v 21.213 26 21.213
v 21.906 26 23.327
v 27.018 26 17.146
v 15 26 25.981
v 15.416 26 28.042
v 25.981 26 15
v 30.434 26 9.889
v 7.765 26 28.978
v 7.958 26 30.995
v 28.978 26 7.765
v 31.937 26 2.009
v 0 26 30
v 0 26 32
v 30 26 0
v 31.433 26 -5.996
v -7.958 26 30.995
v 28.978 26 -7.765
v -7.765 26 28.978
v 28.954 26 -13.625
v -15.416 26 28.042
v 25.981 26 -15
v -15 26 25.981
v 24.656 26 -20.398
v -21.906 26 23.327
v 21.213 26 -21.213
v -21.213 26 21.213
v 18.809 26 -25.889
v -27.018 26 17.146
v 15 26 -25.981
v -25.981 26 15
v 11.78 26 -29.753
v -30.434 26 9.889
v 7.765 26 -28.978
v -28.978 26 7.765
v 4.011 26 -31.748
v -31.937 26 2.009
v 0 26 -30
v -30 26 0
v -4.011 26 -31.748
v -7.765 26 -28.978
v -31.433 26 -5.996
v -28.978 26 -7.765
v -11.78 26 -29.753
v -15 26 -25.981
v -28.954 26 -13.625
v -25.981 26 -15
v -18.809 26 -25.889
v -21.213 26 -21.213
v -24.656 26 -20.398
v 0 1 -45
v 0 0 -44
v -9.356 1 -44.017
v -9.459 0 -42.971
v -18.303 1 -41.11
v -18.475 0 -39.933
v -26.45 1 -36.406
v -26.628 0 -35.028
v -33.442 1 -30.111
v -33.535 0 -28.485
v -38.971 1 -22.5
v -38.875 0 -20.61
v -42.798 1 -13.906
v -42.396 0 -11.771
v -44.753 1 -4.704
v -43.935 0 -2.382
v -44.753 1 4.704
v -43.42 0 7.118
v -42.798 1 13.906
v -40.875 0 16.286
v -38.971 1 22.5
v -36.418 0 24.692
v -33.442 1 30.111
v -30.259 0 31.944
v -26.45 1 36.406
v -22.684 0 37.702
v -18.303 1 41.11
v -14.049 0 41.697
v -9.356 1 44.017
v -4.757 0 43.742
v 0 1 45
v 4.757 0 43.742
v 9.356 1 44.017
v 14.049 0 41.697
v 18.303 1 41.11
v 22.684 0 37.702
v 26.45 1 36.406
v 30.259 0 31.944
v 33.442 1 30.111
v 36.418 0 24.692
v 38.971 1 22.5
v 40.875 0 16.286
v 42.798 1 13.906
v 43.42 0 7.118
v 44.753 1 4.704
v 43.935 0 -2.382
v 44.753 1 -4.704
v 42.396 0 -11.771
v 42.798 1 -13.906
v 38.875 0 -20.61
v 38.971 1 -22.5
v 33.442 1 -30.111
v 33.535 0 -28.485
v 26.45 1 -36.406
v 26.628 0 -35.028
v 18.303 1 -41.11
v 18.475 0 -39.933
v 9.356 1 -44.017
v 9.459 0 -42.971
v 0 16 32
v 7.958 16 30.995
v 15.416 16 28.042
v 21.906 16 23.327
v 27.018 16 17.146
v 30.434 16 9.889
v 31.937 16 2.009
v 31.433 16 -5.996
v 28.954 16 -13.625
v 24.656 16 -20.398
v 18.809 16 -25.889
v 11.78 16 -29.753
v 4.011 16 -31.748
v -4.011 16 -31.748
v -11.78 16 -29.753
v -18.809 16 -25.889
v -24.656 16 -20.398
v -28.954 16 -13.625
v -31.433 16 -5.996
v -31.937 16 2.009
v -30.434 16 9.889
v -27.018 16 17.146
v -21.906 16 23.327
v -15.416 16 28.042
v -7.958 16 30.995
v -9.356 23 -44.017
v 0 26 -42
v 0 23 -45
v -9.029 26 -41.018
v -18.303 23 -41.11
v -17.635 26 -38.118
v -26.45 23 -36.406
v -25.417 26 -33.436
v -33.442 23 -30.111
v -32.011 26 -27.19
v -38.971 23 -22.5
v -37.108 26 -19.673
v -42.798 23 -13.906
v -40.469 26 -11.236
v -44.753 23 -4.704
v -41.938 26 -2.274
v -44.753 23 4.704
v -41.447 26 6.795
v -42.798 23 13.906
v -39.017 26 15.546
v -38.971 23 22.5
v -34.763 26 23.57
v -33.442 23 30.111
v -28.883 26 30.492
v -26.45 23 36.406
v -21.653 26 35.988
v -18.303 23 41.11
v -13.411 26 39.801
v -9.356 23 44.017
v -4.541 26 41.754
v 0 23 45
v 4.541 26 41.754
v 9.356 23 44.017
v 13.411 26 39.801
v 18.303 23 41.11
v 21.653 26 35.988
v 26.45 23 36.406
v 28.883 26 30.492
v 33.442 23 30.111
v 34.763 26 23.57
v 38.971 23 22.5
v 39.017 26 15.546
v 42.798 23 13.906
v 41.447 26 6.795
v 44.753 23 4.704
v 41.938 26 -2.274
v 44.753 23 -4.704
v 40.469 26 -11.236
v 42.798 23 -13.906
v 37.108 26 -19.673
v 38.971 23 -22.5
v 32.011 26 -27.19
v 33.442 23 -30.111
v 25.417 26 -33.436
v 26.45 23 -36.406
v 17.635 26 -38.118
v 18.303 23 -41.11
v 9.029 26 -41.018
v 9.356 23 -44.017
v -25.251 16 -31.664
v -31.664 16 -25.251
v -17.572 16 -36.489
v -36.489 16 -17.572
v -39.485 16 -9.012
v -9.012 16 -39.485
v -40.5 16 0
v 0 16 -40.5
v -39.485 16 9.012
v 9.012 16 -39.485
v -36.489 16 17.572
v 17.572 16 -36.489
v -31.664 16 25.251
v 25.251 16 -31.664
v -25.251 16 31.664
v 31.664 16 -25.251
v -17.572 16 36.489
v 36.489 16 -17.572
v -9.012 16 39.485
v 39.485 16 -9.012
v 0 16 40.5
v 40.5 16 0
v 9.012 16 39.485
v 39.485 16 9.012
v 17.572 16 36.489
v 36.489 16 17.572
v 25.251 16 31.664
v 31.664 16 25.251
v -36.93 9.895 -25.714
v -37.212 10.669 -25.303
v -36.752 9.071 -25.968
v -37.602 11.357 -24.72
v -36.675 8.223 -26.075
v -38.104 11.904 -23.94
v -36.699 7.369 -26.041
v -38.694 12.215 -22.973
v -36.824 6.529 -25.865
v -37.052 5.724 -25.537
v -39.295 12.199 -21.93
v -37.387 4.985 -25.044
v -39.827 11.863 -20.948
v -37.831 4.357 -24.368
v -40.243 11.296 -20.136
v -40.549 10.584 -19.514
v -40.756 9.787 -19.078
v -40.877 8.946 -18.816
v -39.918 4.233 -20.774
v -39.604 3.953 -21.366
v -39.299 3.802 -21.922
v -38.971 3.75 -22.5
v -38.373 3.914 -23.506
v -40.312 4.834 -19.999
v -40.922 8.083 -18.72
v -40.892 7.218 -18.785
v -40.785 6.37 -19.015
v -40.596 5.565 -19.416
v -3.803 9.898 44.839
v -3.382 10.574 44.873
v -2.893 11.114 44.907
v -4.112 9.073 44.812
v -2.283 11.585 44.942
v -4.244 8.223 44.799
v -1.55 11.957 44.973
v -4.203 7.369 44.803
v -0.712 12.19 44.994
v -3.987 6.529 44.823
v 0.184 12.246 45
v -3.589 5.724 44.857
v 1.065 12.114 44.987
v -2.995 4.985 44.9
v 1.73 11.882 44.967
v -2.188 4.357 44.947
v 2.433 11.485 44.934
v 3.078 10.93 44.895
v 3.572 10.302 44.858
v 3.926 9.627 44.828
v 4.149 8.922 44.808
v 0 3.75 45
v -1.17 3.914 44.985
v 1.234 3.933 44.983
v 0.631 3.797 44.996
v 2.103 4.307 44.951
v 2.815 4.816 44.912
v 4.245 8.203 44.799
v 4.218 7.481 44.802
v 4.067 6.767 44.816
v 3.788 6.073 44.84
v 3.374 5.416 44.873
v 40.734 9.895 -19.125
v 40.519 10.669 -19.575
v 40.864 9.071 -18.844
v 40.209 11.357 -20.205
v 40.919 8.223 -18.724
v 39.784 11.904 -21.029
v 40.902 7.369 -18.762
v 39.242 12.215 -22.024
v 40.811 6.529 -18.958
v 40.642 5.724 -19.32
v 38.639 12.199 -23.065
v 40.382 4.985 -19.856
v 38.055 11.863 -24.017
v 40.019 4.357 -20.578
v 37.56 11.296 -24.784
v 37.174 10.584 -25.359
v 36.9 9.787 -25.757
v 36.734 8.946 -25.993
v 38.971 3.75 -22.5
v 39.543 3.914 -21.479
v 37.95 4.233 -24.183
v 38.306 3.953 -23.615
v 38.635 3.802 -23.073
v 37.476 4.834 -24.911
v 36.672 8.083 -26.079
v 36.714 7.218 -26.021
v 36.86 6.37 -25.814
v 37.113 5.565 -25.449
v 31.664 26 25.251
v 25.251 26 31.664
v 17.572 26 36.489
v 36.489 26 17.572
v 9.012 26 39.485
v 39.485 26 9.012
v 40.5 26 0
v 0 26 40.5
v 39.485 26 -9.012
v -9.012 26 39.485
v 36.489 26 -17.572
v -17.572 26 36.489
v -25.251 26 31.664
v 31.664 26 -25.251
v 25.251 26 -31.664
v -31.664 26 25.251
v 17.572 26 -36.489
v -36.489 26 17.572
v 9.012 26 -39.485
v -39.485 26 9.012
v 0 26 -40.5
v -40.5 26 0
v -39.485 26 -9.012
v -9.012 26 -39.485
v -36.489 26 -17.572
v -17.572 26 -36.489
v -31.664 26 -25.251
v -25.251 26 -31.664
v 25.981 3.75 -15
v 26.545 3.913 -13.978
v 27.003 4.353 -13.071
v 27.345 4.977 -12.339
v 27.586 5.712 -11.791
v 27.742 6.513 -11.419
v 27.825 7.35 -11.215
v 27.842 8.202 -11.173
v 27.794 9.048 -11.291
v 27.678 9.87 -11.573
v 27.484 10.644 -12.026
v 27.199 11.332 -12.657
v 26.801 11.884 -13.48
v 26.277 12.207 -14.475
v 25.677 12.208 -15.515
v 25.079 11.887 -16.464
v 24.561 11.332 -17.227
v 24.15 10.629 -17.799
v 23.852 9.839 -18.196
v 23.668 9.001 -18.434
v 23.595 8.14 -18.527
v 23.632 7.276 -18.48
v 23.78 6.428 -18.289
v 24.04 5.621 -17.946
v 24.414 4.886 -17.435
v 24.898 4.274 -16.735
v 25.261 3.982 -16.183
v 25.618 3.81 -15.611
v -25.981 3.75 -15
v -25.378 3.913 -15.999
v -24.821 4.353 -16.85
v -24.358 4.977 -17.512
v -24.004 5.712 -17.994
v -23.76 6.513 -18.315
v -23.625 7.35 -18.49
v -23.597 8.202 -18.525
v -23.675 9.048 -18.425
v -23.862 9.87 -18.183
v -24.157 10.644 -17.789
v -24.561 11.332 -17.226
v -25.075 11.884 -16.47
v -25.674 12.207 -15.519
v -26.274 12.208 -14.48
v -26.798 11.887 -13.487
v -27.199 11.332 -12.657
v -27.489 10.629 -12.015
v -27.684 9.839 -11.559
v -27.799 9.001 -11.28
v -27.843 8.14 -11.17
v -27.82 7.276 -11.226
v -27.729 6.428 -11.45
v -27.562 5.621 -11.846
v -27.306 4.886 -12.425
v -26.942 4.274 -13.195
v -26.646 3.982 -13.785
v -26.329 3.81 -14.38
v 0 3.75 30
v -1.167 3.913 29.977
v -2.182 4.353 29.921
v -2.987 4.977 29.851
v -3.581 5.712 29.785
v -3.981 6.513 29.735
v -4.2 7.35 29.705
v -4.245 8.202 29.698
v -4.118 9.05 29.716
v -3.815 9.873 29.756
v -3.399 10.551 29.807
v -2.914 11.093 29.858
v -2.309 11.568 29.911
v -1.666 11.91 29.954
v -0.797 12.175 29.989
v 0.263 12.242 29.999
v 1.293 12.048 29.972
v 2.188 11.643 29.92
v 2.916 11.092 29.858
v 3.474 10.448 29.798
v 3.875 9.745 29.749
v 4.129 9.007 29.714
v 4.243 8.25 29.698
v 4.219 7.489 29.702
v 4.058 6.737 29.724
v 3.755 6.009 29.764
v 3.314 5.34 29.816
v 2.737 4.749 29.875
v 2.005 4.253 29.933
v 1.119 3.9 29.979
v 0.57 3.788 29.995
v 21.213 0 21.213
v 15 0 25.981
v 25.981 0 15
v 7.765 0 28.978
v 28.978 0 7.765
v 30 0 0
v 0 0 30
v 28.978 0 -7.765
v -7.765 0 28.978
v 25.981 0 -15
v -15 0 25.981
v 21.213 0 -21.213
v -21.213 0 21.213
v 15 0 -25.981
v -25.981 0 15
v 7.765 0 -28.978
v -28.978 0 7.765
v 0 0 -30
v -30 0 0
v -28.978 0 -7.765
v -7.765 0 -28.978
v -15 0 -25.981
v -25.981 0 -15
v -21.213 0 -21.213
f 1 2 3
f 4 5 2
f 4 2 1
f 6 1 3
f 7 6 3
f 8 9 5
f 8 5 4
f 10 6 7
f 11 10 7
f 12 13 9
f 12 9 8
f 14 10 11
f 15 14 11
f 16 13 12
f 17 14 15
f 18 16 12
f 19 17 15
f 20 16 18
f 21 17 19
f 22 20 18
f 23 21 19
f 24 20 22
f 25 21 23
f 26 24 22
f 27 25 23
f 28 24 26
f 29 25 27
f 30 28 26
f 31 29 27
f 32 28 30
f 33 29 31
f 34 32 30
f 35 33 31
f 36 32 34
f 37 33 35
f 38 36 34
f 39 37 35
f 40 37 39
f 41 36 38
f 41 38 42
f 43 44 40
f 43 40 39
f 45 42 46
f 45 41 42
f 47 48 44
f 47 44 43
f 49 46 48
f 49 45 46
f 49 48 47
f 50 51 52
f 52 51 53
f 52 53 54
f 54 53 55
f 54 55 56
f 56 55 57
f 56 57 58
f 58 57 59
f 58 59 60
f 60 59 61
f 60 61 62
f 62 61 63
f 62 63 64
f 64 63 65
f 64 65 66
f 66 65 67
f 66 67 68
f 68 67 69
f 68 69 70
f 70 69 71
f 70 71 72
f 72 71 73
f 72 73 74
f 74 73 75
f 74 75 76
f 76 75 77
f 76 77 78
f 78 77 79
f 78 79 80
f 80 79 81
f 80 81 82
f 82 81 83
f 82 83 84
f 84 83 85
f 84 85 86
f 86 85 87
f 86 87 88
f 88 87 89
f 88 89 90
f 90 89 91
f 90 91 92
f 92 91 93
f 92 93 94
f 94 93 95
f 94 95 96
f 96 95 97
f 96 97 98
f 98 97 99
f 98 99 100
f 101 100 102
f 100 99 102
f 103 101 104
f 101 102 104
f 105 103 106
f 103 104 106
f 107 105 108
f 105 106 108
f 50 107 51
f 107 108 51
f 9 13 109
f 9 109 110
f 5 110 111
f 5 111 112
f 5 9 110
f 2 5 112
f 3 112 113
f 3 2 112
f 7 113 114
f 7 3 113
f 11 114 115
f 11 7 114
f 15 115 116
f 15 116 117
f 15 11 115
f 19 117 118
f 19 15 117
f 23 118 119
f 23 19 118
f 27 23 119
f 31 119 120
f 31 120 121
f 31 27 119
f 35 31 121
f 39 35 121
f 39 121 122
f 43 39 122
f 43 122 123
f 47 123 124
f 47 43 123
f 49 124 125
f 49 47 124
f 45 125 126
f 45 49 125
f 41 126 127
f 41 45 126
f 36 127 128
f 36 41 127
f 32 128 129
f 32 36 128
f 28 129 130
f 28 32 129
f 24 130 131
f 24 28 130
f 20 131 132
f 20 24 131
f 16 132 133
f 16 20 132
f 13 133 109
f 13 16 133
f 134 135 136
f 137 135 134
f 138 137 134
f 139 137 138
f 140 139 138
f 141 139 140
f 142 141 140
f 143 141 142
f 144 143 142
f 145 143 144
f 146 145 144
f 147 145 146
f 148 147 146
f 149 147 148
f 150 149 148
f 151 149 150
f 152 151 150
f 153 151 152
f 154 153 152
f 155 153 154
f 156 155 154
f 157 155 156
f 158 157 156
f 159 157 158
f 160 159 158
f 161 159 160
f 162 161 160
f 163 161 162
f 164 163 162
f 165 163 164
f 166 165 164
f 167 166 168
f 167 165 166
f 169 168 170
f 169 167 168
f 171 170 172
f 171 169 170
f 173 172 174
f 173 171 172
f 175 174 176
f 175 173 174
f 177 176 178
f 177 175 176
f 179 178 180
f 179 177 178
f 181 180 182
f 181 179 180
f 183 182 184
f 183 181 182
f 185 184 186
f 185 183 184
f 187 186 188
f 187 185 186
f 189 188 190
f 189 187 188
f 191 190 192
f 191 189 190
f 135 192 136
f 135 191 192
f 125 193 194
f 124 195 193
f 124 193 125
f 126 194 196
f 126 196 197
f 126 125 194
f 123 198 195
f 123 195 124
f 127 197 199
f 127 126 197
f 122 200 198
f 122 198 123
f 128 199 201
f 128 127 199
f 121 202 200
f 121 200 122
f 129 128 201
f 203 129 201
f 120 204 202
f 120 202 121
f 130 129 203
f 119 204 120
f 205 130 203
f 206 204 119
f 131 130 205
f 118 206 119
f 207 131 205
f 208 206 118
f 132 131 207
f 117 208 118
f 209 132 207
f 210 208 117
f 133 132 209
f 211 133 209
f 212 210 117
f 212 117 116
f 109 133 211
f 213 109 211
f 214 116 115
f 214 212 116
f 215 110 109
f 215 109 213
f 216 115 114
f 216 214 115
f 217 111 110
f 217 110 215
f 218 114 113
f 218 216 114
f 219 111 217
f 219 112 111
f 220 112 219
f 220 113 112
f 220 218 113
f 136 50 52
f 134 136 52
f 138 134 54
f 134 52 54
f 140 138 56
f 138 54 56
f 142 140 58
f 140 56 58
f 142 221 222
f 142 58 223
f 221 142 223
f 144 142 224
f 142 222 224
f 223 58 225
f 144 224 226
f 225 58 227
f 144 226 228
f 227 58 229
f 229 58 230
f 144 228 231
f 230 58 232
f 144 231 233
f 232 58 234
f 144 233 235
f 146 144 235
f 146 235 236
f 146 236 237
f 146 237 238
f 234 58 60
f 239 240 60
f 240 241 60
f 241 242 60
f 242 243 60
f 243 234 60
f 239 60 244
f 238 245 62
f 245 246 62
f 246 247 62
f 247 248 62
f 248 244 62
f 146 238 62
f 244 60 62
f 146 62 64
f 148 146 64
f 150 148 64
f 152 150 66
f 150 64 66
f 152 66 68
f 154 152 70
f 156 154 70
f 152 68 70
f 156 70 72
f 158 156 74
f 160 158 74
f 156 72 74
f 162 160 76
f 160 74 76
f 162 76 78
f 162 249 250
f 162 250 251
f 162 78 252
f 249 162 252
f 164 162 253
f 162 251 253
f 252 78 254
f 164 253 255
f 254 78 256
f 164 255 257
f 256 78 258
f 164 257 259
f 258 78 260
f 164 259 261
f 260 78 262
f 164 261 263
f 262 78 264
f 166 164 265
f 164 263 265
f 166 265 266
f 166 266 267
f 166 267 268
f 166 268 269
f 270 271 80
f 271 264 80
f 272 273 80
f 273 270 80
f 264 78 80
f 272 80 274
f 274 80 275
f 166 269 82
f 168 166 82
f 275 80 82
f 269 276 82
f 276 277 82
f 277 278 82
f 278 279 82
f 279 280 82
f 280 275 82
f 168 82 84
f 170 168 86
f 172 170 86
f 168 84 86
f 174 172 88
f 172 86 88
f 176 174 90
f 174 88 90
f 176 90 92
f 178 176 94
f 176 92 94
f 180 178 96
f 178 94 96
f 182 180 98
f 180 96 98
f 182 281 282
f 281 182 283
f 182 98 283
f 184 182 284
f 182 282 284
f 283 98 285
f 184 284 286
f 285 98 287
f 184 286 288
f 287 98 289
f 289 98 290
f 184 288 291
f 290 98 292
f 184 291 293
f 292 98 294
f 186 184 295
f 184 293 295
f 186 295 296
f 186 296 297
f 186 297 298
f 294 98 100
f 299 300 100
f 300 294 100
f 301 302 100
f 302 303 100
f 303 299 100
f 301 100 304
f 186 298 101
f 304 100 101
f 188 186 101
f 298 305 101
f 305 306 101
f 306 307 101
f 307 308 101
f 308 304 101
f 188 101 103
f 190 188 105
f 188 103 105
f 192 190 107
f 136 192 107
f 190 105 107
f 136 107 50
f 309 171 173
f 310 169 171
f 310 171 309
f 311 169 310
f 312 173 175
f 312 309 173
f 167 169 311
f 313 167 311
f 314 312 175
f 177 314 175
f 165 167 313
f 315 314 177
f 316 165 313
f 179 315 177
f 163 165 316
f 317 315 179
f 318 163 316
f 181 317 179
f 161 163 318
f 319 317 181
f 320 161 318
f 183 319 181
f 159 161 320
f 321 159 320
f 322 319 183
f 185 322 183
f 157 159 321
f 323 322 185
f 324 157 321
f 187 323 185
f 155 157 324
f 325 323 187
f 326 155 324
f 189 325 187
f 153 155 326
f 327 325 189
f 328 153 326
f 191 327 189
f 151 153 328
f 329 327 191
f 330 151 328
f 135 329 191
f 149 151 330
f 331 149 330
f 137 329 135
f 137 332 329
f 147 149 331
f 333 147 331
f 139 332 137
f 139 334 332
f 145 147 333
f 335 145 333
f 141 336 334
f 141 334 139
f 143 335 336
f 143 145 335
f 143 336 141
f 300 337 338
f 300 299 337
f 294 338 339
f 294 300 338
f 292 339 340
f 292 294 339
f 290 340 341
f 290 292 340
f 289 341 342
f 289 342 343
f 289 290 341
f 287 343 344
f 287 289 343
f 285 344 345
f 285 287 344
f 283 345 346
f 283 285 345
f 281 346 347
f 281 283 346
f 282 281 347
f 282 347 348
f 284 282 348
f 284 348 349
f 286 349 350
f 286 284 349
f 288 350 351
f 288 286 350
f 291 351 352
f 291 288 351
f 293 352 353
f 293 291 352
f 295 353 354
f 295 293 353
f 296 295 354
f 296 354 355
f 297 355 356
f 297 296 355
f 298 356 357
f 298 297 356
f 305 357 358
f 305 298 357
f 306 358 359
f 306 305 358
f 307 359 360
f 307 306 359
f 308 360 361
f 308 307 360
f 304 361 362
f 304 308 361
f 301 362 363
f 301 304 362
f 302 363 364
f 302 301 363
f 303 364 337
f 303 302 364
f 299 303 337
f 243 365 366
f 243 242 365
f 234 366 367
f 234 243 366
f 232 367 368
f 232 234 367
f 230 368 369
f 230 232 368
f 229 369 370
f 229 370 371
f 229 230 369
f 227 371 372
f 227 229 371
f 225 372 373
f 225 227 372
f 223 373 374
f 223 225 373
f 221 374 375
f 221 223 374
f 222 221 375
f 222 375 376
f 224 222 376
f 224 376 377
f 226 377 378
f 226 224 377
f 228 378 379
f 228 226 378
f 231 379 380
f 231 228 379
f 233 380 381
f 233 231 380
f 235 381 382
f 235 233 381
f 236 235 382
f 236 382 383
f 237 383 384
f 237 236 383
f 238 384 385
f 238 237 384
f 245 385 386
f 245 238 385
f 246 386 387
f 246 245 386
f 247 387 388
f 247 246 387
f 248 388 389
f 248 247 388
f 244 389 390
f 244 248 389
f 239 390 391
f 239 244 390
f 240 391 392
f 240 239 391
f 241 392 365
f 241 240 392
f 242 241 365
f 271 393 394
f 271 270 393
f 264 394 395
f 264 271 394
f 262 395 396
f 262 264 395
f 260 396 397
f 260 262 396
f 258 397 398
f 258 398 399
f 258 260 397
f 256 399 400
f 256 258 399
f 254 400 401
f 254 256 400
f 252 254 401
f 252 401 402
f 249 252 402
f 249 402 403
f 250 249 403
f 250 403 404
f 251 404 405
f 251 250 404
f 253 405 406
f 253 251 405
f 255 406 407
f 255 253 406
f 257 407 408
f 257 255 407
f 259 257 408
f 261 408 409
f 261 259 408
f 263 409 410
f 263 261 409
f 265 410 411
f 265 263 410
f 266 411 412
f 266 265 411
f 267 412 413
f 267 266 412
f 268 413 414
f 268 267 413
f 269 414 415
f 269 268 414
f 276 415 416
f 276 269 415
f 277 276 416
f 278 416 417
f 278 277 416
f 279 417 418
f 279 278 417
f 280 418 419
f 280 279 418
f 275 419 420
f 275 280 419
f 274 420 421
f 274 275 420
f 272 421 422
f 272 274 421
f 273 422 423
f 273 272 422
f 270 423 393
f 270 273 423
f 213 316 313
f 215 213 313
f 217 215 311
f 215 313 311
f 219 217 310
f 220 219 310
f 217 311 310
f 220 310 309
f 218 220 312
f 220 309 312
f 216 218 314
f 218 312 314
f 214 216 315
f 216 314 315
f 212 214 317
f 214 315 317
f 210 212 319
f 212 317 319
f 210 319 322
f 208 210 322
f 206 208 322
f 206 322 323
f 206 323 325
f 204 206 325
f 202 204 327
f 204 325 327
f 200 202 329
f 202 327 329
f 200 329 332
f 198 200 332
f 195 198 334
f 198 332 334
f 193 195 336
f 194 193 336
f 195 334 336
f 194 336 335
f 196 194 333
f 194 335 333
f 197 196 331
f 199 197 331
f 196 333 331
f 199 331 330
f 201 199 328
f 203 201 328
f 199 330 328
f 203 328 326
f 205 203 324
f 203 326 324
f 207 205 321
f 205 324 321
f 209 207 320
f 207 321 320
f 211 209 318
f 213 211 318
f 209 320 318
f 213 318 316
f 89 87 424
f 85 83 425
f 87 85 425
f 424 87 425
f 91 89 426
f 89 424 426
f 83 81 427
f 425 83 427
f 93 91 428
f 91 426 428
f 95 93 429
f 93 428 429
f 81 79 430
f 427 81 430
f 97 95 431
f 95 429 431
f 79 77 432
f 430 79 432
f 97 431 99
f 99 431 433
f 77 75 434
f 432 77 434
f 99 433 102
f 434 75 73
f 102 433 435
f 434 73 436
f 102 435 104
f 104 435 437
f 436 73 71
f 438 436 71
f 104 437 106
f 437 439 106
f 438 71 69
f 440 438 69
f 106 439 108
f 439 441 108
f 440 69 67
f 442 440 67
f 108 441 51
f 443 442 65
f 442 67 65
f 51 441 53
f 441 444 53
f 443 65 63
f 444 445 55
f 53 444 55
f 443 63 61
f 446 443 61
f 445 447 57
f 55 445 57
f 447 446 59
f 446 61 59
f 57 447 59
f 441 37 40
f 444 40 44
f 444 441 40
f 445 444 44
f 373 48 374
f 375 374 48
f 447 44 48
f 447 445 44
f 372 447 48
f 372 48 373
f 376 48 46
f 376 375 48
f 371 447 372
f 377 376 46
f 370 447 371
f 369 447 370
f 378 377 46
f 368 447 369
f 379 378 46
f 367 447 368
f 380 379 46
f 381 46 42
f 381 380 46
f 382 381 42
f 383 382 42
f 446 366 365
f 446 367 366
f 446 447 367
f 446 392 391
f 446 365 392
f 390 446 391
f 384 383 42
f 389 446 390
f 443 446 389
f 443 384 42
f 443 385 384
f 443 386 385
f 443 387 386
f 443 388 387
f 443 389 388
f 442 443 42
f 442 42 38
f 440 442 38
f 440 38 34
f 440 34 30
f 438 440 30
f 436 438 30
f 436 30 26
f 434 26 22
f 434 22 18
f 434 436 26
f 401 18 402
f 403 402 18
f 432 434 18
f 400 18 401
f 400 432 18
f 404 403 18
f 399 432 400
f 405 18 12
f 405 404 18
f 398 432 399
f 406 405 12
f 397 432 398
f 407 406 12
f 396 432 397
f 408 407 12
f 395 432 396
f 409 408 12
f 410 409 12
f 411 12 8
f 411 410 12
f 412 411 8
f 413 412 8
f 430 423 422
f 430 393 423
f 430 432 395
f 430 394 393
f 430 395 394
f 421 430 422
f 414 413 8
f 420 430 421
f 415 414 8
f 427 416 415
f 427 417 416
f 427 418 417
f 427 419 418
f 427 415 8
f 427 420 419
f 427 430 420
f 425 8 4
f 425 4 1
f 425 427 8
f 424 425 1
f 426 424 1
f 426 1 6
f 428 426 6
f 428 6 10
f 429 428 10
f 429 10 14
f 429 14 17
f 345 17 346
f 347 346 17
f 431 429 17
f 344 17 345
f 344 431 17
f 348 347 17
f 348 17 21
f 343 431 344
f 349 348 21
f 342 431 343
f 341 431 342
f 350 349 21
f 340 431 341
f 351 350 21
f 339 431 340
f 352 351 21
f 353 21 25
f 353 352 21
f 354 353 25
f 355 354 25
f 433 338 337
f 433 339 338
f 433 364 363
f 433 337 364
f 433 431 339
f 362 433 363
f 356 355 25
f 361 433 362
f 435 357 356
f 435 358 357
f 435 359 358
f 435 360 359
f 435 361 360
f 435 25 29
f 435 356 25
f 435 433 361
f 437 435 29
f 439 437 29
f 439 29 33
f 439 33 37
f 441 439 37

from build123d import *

# Parameters (mm, degrees)
SCHIZZO1_R                  = 45
SCHIZZO1_R_2                = 30
ESTRUSIONE1_DEPTH           = 26
SCHIZZO2_R                  = 40.5
SCHIZZO2_R_2                = 32
ESTRUSIONE2_DEPTH           = 10
RIPETIZIONECIRCOLARE1_COUNT = 3
SMUSSO1_SIZE                = 3
SMUSSO2_SIZE                = 1


with BuildPart() as part:
    # Schizzo1 → Estrusione1 (new body)
    with BuildSketch(Plane(origin=(0, 0, 0), x_dir=(1, 0, 0), z_dir=(0, 1, 0))):
        with Locations(Location((0, 0, 0), (0, 0, 90))):
            Circle(SCHIZZO1_R)
        with Locations(Location((0, 0, 0), (0, 0, 90))):
            Circle(SCHIZZO1_R_2, mode=Mode.SUBTRACT)
    extrude(amount=ESTRUSIONE1_DEPTH)

    # Schizzo2 → Estrusione2 (cut)
    with BuildSketch(Plane(origin=(0, 26, 0), x_dir=(1, 0, 0), z_dir=(0, 1, 0))):
        with Locations(Location((0, 0, 0), (0, 0, 270))):
            Circle(SCHIZZO2_R)
        with Locations(Location((0, 0, 0), (0, 0, 270))):
            Circle(SCHIZZO2_R_2, mode=Mode.SUBTRACT)
    extrude(amount=-ESTRUSIONE2_DEPTH, mode=Mode.SUBTRACT)

    # Schizzo3 → Foro filettato M10-1 (revolve, cut)
    with BuildSketch(Plane(origin=(0, 8, 45), x_dir=(0, -1, 0), z_dir=(1, 0, 0))):
        Polygon((0, 0), (0, 50.053657631), (4.25, 47.5), (4.25, 0), align=None)
    foro_filettato_m10_1 = revolve(axis=Axis((0, 8, 51.35), (0, 0, -1)), mode=Mode.SUBTRACT)

    # RipetizioneCircolare1: Foro filettato M10-1 ×3 about axis
    ripetizionecircolare1_axis = Axis((0, 26, 0), (0, -1, 0))
    for i in range(1, RIPETIZIONECIRCOLARE1_COUNT):
        add(foro_filettato_m10_1.rotate(ripetizionecircolare1_axis, i * 360 / RIPETIZIONECIRCOLARE1_COUNT), mode=Mode.SUBTRACT)

    # Smusso1
    smusso1_edges = [part.edges().sort_by_distance(p)[0] for p in [
        (0, 26, 45),
    ]]
    chamfer(smusso1_edges, length=SMUSSO1_SIZE)

    # Smusso2
    smusso2_edges = [part.edges().sort_by_distance(p)[0] for p in [
        (0, 0, 45),
    ]]
    chamfer(smusso2_edges, length=SMUSSO2_SIZE)


solid = part.part
